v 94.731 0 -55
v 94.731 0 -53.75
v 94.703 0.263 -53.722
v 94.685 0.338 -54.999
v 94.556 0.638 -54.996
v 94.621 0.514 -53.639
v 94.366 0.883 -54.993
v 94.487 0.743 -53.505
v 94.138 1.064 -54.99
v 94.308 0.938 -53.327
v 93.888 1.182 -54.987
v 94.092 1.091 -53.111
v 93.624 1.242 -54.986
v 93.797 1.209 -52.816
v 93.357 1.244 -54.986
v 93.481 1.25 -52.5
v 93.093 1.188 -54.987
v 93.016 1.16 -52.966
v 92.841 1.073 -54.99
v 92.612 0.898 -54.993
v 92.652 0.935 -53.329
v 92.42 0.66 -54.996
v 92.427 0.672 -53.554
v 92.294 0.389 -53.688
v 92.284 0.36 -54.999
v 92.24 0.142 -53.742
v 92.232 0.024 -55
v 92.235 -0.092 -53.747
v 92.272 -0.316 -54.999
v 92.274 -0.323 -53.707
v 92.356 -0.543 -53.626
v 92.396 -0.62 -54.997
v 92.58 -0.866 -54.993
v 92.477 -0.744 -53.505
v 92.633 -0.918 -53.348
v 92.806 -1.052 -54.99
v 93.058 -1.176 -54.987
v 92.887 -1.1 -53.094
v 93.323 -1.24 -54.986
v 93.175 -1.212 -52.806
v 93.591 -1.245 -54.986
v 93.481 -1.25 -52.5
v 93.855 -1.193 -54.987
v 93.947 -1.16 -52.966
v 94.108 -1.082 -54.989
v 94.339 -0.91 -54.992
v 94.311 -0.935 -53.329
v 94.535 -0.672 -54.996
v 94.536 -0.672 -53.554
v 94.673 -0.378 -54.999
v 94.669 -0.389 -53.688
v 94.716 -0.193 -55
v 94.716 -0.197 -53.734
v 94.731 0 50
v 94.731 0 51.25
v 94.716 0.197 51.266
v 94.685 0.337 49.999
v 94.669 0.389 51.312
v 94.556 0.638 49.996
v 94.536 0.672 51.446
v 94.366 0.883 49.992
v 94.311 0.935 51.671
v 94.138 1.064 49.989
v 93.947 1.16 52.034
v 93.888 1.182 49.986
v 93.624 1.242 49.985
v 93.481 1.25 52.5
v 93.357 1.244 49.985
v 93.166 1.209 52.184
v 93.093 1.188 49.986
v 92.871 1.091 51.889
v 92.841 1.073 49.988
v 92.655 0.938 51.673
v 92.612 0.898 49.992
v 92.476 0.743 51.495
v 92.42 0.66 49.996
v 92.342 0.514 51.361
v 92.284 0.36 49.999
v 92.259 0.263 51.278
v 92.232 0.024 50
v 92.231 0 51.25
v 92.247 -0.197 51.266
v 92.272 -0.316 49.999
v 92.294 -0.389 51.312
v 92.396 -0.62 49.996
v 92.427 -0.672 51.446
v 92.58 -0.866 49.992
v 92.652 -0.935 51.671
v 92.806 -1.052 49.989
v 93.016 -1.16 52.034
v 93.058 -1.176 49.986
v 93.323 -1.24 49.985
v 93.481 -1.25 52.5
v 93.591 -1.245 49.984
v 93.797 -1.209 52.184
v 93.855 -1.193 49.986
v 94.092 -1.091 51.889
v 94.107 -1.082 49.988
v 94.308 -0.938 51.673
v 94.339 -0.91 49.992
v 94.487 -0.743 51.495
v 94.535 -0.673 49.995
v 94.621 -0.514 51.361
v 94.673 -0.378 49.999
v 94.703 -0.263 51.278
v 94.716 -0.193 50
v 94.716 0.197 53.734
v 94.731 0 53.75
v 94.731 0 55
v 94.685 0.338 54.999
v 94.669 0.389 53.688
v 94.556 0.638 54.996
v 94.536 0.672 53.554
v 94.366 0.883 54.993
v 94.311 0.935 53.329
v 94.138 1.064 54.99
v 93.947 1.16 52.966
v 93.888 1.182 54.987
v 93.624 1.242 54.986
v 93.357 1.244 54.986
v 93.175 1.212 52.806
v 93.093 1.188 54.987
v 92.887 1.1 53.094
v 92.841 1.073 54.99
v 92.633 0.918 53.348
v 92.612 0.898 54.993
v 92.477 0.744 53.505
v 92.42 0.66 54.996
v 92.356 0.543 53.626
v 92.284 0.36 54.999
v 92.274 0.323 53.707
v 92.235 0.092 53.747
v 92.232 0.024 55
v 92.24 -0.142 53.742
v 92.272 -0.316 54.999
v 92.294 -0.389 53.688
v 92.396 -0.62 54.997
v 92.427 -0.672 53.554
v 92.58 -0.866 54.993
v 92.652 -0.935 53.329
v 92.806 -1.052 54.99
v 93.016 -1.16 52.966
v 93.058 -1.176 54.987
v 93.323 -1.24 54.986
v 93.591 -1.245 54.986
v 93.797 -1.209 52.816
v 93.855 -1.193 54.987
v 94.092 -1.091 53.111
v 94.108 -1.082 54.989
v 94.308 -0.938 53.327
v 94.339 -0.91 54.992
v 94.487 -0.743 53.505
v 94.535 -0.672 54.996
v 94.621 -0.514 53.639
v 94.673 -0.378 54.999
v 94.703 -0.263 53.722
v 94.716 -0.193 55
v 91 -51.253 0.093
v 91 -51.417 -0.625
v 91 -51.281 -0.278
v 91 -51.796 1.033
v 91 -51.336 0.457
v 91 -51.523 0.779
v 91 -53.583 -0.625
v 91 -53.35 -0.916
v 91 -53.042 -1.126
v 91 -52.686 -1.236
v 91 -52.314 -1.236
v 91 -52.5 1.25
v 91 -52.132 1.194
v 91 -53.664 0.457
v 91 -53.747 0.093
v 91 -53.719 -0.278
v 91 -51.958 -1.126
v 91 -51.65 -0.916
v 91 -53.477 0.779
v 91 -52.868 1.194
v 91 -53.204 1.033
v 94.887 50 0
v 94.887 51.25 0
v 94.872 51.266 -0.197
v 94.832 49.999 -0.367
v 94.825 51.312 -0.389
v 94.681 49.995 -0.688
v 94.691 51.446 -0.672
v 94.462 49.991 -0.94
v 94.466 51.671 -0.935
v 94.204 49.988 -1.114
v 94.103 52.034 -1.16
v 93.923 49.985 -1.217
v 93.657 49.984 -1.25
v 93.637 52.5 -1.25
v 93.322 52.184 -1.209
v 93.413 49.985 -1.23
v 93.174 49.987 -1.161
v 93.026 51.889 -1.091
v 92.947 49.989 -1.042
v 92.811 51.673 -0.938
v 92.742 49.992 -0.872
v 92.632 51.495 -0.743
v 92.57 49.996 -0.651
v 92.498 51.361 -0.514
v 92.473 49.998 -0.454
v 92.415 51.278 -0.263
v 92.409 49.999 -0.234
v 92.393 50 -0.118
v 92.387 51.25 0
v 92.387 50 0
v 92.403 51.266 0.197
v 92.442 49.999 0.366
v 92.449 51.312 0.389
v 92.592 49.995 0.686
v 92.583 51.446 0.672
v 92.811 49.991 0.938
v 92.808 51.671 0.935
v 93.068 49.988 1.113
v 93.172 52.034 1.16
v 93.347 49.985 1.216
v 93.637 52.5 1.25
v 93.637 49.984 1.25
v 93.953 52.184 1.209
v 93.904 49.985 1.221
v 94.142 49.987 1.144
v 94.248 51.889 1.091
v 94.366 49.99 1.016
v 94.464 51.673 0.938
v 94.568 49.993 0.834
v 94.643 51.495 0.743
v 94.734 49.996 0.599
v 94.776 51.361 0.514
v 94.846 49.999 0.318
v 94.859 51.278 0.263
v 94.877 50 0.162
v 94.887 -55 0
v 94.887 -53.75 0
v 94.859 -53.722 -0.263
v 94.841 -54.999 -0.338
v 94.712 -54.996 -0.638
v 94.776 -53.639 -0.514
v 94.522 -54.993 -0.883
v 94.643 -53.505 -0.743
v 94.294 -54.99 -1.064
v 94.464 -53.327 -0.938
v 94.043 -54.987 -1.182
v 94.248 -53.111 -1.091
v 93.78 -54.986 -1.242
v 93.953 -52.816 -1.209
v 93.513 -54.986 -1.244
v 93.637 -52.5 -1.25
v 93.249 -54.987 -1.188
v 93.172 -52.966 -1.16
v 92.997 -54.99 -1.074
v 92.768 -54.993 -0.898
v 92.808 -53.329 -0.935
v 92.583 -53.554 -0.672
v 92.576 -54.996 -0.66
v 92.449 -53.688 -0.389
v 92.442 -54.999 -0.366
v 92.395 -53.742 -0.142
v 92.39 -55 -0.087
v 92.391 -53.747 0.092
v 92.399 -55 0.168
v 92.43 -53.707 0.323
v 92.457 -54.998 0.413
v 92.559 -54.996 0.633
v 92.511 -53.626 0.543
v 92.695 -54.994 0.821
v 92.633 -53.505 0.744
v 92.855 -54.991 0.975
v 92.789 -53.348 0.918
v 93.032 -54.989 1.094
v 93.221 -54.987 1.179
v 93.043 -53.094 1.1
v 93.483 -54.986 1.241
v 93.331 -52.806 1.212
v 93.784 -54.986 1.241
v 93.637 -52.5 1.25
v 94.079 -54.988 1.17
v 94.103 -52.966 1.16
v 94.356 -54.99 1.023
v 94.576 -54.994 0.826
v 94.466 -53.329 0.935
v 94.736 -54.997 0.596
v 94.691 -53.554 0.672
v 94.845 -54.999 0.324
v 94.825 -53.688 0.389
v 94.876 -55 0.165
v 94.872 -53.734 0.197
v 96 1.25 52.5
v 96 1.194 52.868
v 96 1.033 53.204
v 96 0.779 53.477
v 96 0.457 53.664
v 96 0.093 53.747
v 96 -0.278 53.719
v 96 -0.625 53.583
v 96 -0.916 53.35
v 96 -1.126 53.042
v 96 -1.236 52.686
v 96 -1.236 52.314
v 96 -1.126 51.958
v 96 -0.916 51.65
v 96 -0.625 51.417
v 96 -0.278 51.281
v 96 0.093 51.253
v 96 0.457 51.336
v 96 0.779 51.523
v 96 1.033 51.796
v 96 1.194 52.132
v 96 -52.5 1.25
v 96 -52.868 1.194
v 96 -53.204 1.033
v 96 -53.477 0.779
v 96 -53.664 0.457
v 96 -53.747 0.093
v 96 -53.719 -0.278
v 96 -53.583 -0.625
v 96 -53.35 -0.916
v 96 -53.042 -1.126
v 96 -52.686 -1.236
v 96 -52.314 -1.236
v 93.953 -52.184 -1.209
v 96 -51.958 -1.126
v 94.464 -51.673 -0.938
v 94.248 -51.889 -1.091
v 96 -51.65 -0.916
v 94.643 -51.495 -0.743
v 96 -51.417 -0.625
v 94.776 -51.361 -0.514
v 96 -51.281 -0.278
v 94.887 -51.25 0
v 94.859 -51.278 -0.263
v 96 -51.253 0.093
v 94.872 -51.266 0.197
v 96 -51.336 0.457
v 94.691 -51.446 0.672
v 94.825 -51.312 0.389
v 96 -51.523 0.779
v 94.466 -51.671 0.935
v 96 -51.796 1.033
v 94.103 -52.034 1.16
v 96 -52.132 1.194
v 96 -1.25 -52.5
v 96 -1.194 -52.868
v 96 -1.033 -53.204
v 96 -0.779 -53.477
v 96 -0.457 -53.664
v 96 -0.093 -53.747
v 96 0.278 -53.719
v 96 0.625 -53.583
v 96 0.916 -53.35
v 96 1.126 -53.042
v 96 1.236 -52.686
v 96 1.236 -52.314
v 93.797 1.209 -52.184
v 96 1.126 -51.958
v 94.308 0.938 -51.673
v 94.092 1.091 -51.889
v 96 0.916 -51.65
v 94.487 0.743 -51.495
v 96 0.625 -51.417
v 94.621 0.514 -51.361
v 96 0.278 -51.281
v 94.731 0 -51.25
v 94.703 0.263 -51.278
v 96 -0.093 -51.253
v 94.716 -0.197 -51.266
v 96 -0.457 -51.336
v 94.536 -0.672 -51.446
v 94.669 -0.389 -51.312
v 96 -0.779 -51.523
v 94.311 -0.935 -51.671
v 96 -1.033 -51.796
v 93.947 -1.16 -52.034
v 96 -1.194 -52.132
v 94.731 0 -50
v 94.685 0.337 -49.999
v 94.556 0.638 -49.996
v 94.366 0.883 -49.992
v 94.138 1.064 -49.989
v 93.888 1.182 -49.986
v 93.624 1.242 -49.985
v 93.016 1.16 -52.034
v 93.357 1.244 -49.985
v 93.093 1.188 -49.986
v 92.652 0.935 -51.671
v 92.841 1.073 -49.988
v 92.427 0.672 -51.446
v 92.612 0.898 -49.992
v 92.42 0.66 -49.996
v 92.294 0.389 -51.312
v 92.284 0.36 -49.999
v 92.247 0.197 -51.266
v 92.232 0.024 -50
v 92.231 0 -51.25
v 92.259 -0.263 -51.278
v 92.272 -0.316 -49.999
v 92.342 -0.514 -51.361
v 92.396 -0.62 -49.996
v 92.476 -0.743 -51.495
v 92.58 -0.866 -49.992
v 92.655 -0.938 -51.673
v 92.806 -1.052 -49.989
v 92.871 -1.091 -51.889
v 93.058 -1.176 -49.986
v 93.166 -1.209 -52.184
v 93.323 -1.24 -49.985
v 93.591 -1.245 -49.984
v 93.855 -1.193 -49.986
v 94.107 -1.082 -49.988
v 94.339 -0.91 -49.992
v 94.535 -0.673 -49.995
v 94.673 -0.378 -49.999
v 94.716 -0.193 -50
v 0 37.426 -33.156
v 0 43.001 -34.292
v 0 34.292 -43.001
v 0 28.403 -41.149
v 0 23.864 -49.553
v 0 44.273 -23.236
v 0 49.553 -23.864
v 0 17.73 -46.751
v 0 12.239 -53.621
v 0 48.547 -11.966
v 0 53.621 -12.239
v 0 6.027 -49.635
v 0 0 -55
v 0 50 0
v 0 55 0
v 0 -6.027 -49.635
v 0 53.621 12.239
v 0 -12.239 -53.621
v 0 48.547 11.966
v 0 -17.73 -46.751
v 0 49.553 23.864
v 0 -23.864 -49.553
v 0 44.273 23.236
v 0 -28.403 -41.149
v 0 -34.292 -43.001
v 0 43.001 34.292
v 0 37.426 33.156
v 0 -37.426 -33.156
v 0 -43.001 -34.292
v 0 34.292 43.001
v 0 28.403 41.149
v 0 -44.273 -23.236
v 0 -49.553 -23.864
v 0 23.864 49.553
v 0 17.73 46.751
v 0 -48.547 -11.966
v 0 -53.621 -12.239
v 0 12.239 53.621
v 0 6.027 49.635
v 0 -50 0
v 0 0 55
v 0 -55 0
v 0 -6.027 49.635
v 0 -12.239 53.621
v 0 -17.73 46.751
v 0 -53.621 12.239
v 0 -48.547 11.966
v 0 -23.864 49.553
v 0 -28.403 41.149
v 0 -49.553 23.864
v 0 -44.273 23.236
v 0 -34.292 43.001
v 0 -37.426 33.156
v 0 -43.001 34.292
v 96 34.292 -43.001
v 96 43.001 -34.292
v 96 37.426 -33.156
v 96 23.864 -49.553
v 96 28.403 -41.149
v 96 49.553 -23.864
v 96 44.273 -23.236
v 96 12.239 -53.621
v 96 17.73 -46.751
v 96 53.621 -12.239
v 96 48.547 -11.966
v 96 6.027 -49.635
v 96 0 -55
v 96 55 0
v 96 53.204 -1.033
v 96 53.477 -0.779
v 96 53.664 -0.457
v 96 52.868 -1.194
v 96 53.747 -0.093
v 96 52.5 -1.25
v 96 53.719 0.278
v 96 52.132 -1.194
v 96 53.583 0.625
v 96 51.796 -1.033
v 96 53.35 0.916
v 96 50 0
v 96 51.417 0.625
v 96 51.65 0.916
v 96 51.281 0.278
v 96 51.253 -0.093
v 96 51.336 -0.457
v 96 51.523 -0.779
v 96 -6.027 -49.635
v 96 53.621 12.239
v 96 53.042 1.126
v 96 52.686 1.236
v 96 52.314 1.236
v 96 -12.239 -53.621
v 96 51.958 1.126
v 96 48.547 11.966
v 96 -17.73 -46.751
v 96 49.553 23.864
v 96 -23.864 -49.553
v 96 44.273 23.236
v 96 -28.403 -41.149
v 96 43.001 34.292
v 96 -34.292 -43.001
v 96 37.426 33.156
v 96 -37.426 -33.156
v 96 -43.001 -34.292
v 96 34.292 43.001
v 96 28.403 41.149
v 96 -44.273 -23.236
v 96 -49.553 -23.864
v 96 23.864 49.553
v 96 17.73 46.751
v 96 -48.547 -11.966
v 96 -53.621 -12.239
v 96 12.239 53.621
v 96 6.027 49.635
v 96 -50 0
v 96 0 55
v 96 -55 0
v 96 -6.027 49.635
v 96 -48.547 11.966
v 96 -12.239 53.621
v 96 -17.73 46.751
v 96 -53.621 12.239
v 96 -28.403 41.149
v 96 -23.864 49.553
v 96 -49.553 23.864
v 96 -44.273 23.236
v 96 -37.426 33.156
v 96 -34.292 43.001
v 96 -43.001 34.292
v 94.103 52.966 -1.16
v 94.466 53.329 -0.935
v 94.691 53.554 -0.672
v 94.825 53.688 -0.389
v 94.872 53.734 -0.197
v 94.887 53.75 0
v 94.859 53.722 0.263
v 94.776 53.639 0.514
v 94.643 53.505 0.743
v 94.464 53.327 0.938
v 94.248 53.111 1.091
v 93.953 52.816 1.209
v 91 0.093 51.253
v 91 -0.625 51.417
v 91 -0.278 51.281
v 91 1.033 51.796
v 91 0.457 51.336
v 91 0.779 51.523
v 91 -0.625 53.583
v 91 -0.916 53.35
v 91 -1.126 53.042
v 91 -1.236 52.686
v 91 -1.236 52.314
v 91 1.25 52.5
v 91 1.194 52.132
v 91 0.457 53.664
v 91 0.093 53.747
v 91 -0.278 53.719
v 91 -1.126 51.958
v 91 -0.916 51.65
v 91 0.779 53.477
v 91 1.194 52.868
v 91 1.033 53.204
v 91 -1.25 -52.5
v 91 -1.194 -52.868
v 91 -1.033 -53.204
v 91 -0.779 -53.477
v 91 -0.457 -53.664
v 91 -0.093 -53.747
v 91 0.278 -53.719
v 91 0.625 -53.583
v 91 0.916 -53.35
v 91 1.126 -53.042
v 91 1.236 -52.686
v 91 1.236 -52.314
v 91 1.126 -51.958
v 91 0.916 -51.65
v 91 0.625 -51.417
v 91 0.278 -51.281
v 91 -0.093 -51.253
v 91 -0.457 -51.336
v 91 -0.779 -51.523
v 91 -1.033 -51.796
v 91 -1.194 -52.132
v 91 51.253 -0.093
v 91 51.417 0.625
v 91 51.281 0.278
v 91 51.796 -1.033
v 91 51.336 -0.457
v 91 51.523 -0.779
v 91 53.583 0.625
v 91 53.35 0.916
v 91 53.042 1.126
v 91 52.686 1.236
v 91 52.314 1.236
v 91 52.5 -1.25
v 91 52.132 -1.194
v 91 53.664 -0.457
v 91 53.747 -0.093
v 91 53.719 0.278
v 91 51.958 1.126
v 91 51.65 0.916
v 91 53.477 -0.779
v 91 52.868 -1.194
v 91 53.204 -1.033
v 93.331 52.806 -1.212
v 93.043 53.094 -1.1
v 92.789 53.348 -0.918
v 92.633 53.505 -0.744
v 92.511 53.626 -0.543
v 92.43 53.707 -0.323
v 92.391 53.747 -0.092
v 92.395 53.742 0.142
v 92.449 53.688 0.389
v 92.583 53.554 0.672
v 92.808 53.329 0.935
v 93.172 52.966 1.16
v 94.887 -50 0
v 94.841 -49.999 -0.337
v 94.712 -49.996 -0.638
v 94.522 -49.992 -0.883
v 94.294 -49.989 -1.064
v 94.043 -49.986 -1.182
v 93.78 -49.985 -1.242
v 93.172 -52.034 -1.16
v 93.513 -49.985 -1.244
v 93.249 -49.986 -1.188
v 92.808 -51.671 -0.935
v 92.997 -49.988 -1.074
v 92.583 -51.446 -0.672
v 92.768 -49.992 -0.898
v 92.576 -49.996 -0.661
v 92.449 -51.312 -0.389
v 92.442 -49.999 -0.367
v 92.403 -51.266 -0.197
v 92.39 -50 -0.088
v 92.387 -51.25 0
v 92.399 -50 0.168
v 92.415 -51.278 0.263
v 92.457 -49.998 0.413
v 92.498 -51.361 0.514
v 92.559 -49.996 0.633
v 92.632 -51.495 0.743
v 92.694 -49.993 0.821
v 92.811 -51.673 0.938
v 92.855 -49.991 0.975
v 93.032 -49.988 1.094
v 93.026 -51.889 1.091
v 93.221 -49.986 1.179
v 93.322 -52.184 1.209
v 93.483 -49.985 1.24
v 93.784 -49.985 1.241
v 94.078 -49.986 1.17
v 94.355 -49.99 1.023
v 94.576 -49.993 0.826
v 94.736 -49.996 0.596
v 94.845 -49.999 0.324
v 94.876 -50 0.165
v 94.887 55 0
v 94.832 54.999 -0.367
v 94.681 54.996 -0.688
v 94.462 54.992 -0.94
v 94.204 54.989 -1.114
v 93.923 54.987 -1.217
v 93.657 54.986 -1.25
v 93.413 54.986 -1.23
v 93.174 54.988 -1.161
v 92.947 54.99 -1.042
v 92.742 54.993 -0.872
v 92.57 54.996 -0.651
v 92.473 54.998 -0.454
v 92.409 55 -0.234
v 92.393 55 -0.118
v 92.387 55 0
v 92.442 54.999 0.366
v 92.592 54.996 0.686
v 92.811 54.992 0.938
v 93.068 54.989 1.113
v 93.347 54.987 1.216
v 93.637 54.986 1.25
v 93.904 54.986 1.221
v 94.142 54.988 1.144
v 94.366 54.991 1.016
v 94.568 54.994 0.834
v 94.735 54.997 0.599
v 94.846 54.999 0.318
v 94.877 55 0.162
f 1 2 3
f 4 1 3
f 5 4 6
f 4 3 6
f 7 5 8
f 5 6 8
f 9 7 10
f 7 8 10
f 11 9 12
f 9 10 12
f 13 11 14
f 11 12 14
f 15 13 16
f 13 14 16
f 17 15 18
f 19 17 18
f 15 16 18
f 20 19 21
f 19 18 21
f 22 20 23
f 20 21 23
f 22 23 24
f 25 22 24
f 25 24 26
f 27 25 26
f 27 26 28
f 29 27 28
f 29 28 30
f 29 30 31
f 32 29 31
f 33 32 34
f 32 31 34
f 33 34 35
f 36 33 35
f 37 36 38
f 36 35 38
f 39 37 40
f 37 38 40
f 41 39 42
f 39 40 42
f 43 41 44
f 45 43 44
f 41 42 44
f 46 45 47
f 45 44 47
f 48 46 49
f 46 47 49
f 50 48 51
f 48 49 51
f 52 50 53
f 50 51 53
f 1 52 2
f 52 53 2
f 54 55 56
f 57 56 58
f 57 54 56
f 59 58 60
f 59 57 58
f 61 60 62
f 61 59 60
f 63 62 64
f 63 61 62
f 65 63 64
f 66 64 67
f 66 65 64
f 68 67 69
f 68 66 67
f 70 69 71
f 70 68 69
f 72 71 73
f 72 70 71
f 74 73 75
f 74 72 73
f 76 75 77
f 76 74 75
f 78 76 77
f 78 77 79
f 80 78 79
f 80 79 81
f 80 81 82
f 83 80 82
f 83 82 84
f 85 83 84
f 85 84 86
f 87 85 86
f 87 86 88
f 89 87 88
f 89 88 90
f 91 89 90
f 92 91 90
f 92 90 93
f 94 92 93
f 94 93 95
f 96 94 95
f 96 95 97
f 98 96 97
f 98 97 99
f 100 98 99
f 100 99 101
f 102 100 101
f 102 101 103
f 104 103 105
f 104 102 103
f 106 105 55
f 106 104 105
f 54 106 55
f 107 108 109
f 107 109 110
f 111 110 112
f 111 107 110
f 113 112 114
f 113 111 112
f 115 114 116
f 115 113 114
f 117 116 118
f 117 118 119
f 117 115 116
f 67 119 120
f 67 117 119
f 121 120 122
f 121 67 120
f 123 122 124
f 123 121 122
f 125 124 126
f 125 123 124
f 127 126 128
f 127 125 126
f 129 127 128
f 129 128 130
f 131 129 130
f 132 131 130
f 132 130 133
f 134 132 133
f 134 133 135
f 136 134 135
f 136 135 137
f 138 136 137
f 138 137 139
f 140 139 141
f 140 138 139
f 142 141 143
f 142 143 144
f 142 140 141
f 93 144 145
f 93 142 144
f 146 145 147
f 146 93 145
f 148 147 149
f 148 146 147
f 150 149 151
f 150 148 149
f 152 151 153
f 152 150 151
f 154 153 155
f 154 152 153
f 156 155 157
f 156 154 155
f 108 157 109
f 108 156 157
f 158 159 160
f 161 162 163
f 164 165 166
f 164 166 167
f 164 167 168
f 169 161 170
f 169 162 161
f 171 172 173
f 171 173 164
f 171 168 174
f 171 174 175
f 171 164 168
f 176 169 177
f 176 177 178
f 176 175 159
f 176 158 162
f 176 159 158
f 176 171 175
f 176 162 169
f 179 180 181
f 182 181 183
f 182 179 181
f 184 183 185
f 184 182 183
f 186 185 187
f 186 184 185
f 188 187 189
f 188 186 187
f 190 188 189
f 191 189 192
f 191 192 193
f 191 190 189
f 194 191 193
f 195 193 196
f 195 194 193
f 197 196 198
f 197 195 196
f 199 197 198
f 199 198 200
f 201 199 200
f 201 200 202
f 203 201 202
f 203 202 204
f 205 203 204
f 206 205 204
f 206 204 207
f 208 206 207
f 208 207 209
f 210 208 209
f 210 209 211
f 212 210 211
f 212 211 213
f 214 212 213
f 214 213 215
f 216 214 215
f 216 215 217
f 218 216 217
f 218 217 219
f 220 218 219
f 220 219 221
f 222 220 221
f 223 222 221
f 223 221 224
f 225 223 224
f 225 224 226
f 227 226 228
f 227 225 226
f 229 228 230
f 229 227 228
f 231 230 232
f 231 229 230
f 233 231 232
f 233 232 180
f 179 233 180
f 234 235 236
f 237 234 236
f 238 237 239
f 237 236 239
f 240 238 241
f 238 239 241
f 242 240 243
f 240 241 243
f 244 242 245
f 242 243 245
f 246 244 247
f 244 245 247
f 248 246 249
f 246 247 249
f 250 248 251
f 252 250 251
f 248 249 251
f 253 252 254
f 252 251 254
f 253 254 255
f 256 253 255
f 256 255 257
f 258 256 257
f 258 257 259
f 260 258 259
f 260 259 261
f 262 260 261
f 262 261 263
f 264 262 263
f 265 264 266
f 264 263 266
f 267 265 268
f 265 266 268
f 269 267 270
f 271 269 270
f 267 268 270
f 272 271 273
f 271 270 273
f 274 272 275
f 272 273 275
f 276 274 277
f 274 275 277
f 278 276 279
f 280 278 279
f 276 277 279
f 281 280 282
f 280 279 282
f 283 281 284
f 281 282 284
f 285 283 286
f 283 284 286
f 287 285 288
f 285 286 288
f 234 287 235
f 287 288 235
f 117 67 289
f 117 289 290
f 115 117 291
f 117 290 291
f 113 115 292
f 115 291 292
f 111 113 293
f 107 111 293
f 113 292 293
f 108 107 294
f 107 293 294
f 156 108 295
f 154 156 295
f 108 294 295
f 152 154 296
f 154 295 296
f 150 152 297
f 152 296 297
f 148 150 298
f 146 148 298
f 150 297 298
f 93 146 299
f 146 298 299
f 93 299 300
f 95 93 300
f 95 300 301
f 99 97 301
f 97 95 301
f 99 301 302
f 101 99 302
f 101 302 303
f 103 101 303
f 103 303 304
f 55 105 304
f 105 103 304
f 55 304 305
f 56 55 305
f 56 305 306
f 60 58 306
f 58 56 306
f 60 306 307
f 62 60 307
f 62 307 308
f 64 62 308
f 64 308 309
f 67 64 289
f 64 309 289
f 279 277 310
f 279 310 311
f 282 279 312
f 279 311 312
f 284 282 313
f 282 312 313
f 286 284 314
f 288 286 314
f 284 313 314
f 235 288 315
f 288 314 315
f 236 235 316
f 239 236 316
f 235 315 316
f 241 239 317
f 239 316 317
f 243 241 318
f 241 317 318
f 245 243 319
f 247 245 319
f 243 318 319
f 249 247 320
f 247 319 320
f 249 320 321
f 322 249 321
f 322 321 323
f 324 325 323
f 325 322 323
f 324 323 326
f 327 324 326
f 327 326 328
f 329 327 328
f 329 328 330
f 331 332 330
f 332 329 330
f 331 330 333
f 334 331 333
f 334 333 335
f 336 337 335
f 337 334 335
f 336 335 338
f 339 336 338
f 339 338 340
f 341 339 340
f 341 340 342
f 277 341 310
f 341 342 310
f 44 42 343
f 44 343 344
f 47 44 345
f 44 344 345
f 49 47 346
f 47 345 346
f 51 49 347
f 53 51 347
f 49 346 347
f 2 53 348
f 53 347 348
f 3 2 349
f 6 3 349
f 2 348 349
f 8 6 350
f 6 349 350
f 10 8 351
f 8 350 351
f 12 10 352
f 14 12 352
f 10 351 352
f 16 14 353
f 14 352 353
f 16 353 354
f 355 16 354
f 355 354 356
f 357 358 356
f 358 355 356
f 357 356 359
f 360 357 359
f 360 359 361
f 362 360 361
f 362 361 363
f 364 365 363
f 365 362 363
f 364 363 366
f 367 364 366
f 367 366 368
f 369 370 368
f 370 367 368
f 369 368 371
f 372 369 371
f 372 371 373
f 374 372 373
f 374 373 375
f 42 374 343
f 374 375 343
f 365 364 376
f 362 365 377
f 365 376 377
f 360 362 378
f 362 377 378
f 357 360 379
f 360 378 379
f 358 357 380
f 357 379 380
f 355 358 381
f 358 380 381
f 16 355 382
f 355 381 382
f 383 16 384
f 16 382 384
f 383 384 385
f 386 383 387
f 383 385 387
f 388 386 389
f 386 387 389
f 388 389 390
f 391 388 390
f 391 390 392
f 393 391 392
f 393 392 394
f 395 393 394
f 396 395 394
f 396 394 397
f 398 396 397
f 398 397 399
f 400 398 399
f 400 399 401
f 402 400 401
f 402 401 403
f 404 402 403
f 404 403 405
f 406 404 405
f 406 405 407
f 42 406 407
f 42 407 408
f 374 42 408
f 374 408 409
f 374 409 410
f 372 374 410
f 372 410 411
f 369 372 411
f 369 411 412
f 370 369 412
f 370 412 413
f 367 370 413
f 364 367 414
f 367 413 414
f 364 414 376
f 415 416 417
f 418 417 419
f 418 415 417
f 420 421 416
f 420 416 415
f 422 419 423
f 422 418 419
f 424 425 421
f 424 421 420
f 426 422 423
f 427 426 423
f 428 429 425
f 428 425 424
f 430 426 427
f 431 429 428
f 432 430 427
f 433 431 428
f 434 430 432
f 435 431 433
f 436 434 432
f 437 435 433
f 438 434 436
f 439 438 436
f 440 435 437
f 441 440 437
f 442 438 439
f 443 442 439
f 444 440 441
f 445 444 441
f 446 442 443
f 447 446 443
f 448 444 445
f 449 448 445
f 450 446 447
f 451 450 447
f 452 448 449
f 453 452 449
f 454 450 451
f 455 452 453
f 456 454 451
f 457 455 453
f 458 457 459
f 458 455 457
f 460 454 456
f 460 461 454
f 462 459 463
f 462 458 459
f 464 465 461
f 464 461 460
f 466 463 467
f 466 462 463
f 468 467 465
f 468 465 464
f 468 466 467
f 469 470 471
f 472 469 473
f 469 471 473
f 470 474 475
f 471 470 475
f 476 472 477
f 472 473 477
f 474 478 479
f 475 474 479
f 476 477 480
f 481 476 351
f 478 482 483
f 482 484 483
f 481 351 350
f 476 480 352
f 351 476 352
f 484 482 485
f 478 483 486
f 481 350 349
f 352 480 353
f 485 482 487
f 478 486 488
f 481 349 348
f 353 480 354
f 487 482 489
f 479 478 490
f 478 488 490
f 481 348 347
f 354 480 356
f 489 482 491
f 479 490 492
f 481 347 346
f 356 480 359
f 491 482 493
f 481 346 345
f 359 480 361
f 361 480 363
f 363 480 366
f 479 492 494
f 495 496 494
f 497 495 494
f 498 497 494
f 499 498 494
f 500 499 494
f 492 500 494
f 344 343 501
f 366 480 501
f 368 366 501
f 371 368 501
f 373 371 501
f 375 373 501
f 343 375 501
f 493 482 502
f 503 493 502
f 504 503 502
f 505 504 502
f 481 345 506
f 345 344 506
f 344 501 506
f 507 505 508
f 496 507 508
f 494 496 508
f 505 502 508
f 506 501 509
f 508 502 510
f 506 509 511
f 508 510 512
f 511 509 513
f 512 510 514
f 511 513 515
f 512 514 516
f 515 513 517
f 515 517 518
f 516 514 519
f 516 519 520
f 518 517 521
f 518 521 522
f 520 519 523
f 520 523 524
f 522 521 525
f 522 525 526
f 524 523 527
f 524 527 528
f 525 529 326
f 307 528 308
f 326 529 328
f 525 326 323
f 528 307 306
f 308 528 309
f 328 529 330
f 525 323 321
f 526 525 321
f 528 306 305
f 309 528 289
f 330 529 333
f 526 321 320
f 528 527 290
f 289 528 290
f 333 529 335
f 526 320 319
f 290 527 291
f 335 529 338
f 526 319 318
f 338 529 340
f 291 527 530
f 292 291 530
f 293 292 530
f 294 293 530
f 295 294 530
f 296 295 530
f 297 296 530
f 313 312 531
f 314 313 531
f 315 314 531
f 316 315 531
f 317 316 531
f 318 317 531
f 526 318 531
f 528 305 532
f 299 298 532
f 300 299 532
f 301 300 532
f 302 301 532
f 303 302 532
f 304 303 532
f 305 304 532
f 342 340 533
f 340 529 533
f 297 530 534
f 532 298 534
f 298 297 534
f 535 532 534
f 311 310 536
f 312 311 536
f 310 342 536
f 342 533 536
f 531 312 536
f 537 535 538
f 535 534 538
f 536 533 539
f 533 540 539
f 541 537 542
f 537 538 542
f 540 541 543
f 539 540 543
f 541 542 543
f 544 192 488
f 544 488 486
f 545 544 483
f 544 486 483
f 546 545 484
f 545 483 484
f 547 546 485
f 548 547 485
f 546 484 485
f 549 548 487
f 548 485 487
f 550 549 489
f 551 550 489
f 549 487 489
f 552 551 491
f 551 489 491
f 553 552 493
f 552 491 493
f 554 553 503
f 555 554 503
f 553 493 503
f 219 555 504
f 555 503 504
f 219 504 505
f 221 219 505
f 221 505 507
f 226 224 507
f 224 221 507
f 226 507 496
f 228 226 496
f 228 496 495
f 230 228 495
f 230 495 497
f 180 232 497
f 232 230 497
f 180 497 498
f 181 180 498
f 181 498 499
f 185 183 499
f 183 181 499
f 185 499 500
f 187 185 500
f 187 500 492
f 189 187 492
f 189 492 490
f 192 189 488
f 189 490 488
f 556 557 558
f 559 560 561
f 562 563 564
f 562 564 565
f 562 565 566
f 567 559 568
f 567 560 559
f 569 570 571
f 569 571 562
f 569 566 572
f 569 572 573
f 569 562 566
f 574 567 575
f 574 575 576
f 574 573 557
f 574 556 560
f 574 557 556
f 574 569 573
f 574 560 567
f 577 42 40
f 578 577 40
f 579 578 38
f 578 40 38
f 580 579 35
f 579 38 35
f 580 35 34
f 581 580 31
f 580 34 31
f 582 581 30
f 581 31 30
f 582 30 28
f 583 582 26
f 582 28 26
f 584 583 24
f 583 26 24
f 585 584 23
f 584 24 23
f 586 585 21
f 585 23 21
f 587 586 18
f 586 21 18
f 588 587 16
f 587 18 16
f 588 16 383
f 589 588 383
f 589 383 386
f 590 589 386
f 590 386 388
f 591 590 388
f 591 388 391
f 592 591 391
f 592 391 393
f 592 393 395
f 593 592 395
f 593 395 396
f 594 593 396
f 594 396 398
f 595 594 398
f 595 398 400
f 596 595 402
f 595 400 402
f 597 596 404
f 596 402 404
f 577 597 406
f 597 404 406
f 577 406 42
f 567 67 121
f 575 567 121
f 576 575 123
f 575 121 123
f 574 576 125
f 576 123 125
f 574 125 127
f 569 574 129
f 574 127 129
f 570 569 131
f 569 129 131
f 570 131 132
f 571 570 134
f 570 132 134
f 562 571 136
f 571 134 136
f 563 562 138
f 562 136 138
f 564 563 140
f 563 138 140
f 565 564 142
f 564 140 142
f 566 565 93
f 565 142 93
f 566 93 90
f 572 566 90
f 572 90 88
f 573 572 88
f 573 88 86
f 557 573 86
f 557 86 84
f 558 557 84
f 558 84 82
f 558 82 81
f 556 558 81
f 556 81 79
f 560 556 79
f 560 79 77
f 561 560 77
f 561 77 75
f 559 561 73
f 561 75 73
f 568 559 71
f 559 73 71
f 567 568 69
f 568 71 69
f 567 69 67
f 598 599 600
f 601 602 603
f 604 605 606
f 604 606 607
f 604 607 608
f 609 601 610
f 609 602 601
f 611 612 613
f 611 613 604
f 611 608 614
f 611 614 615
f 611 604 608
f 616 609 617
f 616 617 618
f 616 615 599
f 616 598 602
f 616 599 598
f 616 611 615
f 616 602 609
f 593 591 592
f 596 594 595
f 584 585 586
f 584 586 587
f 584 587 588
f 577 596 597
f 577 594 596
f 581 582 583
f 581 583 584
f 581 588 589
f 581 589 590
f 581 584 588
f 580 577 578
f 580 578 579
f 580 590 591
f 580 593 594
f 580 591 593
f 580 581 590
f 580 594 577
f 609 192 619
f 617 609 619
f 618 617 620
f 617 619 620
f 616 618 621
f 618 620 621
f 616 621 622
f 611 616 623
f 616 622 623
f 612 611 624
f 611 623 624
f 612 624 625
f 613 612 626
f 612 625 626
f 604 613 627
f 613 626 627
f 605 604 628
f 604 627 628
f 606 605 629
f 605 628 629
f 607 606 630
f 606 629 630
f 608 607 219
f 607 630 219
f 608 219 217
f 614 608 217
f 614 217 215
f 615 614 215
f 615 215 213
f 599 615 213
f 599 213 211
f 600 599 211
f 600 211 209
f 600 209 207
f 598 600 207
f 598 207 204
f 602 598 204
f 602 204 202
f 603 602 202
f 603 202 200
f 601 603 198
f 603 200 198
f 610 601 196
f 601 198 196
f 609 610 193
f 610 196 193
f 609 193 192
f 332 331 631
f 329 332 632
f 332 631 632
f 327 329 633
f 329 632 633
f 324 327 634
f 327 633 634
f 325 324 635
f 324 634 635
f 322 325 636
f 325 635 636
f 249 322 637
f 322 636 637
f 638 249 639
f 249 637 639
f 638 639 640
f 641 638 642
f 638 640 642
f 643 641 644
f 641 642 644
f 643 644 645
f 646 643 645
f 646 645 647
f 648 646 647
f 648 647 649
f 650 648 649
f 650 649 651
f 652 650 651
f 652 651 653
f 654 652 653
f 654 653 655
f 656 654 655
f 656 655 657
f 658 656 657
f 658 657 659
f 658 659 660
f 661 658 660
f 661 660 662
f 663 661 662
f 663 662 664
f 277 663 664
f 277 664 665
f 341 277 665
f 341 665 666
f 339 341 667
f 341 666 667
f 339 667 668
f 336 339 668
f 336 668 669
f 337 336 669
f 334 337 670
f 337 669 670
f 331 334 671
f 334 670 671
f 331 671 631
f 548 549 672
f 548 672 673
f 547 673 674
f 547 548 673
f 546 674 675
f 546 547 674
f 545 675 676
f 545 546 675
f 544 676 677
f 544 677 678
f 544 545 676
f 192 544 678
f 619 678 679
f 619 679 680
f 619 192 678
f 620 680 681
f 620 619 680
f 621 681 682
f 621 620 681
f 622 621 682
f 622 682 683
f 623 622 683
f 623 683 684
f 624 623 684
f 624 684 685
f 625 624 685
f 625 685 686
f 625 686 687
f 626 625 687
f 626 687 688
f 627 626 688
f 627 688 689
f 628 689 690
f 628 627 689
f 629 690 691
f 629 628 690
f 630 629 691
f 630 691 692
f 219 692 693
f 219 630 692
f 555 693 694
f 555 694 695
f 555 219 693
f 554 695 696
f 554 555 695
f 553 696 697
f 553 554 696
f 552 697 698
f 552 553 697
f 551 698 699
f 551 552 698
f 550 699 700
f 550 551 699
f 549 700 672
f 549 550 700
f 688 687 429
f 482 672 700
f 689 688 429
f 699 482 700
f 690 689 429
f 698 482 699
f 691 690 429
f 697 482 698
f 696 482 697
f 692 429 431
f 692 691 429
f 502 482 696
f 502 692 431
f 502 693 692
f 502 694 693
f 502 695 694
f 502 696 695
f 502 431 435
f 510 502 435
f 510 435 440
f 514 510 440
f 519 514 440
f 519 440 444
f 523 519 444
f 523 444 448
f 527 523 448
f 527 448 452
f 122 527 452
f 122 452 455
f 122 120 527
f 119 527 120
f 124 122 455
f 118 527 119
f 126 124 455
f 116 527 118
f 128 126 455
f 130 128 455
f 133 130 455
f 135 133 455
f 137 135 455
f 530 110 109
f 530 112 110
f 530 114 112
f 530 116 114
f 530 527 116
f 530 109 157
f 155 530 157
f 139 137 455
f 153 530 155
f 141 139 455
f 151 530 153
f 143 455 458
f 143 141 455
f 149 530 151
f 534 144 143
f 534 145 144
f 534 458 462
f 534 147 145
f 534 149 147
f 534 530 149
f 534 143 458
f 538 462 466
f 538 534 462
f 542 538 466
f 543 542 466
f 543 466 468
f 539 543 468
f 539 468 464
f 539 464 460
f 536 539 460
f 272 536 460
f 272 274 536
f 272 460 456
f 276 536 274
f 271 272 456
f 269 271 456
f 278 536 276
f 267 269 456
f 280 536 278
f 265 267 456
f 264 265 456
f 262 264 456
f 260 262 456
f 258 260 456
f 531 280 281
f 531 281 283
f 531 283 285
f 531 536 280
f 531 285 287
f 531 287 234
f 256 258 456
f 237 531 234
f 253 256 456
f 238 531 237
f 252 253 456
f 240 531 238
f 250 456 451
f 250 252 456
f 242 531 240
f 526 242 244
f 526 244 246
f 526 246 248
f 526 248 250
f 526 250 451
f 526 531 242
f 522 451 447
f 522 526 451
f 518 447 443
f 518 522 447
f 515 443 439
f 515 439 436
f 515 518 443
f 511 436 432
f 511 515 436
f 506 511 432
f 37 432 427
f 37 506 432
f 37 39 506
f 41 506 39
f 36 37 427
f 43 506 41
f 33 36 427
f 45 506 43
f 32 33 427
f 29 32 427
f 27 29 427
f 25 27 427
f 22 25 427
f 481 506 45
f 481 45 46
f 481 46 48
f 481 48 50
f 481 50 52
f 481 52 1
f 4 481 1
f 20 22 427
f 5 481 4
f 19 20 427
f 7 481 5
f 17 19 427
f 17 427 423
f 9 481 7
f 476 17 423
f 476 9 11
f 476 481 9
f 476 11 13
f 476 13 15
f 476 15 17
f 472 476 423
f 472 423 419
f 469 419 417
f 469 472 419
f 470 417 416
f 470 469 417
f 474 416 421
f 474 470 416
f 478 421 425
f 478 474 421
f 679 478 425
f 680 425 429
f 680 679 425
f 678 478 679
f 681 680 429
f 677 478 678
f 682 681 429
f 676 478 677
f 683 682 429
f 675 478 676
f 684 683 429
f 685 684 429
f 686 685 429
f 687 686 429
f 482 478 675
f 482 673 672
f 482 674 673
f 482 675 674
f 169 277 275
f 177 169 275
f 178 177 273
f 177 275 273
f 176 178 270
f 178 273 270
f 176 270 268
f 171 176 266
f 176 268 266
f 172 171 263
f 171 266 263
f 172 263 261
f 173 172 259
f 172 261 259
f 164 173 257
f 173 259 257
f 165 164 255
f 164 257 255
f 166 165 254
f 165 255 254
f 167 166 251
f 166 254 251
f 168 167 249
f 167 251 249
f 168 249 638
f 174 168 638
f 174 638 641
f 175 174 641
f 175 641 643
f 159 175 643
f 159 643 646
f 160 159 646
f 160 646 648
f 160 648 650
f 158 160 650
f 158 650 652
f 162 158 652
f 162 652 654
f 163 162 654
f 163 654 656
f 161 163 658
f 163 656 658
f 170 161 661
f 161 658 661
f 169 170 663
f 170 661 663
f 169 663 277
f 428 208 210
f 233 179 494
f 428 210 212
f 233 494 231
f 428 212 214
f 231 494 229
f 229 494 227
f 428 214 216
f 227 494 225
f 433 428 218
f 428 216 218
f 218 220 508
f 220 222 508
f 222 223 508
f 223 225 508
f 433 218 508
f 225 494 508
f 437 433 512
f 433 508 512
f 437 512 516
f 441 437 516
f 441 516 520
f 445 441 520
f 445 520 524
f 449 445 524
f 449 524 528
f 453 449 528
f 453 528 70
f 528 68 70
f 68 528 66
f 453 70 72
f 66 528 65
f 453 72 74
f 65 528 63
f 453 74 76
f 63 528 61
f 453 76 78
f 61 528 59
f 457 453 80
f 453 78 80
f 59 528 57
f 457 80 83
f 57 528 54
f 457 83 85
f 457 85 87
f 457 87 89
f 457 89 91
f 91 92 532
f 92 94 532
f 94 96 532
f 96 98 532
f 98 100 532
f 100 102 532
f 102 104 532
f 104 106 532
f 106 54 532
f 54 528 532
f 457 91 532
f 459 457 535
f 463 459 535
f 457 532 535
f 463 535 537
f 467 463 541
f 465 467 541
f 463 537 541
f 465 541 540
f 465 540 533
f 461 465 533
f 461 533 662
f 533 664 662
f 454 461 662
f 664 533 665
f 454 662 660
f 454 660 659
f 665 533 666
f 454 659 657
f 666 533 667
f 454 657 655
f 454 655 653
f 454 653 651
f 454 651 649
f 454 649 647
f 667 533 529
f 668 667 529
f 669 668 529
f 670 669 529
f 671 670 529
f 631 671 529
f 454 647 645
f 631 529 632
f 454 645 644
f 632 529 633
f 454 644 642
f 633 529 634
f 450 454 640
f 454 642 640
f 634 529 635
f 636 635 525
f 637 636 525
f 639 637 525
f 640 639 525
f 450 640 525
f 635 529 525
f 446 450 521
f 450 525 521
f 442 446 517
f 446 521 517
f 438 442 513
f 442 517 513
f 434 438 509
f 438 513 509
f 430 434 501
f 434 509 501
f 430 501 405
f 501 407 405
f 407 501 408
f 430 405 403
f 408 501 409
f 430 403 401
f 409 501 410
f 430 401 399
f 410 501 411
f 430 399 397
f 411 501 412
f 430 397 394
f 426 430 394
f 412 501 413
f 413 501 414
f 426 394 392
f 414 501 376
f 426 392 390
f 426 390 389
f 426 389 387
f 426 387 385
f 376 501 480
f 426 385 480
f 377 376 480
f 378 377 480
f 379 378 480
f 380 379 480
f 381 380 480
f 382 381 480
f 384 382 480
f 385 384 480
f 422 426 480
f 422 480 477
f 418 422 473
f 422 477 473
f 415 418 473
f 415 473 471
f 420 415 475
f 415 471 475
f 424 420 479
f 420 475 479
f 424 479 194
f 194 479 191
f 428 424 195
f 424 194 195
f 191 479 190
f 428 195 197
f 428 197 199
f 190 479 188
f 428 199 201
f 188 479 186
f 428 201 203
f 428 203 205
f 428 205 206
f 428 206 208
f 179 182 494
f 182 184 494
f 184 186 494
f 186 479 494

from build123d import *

# Parameters (mm, degrees)
SKETCH1_W               = 96
SKETCH1_H               = 5
SKETCH2_R               = 1.25
CUT_EXTRUDE1_DEPTH      = 56
CUT_EXTRUDE1_DEPTH_BACK = 56
SKETCH4_R               = 1.25
CUT_EXTRUDE2_DEPTH      = 56.0000001
CUT_EXTRUDE2_DEPTH_BACK = 56.0000001
SKETCH5_R               = 1.25
CUT_EXTRUDE3_DEPTH      = 5
CIRPATTERN1_COUNT       = 4


with BuildPart() as part:
    # Sketch1 → Revolve1 (revolve)
    with BuildSketch(Plane.XY):
        with Locations((48, 52.5)):
            Rectangle(SKETCH1_W, SKETCH1_H)
    revolve(axis=Axis((0, 0, 0), (1, 0, 0)))

    # Sketch2 → Cut-Extrude1 (cut, two sides)
    with BuildSketch(Plane(origin=(0, 0, 0), x_dir=(1, 0, 0), z_dir=(0, 1, 0))) as cut_extrude1_sk:
        with Locations((93.637235836, 0)):
            Circle(SKETCH2_R)
    extrude(amount=CUT_EXTRUDE1_DEPTH, mode=Mode.SUBTRACT)
    extrude(cut_extrude1_sk.sketch, amount=-CUT_EXTRUDE1_DEPTH_BACK, mode=Mode.SUBTRACT)

    # Sketch4 → Cut-Extrude2 (cut, two sides)
    with BuildSketch(Plane.XY) as cut_extrude2_sk:
        with Locations((93.481477352, 0)):
            Circle(SKETCH4_R)
    extrude(amount=CUT_EXTRUDE2_DEPTH, mode=Mode.SUBTRACT)
    extrude(cut_extrude2_sk.sketch, amount=-CUT_EXTRUDE2_DEPTH_BACK, mode=Mode.SUBTRACT)

    # Sketch5 → Cut-Extrude3 (cut)
    with BuildSketch(Plane(origin=(96, 0, 0), x_dir=(0, 0, -1), z_dir=(1, 0, 0))):
        with Locations((0, 52.5)):
            Circle(SKETCH5_R)
    cut_extrude3 = extrude(amount=-CUT_EXTRUDE3_DEPTH, mode=Mode.SUBTRACT)

    # CirPattern1: Cut-Extrude3 ×4 about axis
    cirpattern1_axis = Axis((0, 0, 0), (1, 0, 0))
    for i in range(1, CIRPATTERN1_COUNT):
        add(cut_extrude3.rotate(cirpattern1_axis, i * 360 / CIRPATTERN1_COUNT), mode=Mode.SUBTRACT)


solid = part.part
